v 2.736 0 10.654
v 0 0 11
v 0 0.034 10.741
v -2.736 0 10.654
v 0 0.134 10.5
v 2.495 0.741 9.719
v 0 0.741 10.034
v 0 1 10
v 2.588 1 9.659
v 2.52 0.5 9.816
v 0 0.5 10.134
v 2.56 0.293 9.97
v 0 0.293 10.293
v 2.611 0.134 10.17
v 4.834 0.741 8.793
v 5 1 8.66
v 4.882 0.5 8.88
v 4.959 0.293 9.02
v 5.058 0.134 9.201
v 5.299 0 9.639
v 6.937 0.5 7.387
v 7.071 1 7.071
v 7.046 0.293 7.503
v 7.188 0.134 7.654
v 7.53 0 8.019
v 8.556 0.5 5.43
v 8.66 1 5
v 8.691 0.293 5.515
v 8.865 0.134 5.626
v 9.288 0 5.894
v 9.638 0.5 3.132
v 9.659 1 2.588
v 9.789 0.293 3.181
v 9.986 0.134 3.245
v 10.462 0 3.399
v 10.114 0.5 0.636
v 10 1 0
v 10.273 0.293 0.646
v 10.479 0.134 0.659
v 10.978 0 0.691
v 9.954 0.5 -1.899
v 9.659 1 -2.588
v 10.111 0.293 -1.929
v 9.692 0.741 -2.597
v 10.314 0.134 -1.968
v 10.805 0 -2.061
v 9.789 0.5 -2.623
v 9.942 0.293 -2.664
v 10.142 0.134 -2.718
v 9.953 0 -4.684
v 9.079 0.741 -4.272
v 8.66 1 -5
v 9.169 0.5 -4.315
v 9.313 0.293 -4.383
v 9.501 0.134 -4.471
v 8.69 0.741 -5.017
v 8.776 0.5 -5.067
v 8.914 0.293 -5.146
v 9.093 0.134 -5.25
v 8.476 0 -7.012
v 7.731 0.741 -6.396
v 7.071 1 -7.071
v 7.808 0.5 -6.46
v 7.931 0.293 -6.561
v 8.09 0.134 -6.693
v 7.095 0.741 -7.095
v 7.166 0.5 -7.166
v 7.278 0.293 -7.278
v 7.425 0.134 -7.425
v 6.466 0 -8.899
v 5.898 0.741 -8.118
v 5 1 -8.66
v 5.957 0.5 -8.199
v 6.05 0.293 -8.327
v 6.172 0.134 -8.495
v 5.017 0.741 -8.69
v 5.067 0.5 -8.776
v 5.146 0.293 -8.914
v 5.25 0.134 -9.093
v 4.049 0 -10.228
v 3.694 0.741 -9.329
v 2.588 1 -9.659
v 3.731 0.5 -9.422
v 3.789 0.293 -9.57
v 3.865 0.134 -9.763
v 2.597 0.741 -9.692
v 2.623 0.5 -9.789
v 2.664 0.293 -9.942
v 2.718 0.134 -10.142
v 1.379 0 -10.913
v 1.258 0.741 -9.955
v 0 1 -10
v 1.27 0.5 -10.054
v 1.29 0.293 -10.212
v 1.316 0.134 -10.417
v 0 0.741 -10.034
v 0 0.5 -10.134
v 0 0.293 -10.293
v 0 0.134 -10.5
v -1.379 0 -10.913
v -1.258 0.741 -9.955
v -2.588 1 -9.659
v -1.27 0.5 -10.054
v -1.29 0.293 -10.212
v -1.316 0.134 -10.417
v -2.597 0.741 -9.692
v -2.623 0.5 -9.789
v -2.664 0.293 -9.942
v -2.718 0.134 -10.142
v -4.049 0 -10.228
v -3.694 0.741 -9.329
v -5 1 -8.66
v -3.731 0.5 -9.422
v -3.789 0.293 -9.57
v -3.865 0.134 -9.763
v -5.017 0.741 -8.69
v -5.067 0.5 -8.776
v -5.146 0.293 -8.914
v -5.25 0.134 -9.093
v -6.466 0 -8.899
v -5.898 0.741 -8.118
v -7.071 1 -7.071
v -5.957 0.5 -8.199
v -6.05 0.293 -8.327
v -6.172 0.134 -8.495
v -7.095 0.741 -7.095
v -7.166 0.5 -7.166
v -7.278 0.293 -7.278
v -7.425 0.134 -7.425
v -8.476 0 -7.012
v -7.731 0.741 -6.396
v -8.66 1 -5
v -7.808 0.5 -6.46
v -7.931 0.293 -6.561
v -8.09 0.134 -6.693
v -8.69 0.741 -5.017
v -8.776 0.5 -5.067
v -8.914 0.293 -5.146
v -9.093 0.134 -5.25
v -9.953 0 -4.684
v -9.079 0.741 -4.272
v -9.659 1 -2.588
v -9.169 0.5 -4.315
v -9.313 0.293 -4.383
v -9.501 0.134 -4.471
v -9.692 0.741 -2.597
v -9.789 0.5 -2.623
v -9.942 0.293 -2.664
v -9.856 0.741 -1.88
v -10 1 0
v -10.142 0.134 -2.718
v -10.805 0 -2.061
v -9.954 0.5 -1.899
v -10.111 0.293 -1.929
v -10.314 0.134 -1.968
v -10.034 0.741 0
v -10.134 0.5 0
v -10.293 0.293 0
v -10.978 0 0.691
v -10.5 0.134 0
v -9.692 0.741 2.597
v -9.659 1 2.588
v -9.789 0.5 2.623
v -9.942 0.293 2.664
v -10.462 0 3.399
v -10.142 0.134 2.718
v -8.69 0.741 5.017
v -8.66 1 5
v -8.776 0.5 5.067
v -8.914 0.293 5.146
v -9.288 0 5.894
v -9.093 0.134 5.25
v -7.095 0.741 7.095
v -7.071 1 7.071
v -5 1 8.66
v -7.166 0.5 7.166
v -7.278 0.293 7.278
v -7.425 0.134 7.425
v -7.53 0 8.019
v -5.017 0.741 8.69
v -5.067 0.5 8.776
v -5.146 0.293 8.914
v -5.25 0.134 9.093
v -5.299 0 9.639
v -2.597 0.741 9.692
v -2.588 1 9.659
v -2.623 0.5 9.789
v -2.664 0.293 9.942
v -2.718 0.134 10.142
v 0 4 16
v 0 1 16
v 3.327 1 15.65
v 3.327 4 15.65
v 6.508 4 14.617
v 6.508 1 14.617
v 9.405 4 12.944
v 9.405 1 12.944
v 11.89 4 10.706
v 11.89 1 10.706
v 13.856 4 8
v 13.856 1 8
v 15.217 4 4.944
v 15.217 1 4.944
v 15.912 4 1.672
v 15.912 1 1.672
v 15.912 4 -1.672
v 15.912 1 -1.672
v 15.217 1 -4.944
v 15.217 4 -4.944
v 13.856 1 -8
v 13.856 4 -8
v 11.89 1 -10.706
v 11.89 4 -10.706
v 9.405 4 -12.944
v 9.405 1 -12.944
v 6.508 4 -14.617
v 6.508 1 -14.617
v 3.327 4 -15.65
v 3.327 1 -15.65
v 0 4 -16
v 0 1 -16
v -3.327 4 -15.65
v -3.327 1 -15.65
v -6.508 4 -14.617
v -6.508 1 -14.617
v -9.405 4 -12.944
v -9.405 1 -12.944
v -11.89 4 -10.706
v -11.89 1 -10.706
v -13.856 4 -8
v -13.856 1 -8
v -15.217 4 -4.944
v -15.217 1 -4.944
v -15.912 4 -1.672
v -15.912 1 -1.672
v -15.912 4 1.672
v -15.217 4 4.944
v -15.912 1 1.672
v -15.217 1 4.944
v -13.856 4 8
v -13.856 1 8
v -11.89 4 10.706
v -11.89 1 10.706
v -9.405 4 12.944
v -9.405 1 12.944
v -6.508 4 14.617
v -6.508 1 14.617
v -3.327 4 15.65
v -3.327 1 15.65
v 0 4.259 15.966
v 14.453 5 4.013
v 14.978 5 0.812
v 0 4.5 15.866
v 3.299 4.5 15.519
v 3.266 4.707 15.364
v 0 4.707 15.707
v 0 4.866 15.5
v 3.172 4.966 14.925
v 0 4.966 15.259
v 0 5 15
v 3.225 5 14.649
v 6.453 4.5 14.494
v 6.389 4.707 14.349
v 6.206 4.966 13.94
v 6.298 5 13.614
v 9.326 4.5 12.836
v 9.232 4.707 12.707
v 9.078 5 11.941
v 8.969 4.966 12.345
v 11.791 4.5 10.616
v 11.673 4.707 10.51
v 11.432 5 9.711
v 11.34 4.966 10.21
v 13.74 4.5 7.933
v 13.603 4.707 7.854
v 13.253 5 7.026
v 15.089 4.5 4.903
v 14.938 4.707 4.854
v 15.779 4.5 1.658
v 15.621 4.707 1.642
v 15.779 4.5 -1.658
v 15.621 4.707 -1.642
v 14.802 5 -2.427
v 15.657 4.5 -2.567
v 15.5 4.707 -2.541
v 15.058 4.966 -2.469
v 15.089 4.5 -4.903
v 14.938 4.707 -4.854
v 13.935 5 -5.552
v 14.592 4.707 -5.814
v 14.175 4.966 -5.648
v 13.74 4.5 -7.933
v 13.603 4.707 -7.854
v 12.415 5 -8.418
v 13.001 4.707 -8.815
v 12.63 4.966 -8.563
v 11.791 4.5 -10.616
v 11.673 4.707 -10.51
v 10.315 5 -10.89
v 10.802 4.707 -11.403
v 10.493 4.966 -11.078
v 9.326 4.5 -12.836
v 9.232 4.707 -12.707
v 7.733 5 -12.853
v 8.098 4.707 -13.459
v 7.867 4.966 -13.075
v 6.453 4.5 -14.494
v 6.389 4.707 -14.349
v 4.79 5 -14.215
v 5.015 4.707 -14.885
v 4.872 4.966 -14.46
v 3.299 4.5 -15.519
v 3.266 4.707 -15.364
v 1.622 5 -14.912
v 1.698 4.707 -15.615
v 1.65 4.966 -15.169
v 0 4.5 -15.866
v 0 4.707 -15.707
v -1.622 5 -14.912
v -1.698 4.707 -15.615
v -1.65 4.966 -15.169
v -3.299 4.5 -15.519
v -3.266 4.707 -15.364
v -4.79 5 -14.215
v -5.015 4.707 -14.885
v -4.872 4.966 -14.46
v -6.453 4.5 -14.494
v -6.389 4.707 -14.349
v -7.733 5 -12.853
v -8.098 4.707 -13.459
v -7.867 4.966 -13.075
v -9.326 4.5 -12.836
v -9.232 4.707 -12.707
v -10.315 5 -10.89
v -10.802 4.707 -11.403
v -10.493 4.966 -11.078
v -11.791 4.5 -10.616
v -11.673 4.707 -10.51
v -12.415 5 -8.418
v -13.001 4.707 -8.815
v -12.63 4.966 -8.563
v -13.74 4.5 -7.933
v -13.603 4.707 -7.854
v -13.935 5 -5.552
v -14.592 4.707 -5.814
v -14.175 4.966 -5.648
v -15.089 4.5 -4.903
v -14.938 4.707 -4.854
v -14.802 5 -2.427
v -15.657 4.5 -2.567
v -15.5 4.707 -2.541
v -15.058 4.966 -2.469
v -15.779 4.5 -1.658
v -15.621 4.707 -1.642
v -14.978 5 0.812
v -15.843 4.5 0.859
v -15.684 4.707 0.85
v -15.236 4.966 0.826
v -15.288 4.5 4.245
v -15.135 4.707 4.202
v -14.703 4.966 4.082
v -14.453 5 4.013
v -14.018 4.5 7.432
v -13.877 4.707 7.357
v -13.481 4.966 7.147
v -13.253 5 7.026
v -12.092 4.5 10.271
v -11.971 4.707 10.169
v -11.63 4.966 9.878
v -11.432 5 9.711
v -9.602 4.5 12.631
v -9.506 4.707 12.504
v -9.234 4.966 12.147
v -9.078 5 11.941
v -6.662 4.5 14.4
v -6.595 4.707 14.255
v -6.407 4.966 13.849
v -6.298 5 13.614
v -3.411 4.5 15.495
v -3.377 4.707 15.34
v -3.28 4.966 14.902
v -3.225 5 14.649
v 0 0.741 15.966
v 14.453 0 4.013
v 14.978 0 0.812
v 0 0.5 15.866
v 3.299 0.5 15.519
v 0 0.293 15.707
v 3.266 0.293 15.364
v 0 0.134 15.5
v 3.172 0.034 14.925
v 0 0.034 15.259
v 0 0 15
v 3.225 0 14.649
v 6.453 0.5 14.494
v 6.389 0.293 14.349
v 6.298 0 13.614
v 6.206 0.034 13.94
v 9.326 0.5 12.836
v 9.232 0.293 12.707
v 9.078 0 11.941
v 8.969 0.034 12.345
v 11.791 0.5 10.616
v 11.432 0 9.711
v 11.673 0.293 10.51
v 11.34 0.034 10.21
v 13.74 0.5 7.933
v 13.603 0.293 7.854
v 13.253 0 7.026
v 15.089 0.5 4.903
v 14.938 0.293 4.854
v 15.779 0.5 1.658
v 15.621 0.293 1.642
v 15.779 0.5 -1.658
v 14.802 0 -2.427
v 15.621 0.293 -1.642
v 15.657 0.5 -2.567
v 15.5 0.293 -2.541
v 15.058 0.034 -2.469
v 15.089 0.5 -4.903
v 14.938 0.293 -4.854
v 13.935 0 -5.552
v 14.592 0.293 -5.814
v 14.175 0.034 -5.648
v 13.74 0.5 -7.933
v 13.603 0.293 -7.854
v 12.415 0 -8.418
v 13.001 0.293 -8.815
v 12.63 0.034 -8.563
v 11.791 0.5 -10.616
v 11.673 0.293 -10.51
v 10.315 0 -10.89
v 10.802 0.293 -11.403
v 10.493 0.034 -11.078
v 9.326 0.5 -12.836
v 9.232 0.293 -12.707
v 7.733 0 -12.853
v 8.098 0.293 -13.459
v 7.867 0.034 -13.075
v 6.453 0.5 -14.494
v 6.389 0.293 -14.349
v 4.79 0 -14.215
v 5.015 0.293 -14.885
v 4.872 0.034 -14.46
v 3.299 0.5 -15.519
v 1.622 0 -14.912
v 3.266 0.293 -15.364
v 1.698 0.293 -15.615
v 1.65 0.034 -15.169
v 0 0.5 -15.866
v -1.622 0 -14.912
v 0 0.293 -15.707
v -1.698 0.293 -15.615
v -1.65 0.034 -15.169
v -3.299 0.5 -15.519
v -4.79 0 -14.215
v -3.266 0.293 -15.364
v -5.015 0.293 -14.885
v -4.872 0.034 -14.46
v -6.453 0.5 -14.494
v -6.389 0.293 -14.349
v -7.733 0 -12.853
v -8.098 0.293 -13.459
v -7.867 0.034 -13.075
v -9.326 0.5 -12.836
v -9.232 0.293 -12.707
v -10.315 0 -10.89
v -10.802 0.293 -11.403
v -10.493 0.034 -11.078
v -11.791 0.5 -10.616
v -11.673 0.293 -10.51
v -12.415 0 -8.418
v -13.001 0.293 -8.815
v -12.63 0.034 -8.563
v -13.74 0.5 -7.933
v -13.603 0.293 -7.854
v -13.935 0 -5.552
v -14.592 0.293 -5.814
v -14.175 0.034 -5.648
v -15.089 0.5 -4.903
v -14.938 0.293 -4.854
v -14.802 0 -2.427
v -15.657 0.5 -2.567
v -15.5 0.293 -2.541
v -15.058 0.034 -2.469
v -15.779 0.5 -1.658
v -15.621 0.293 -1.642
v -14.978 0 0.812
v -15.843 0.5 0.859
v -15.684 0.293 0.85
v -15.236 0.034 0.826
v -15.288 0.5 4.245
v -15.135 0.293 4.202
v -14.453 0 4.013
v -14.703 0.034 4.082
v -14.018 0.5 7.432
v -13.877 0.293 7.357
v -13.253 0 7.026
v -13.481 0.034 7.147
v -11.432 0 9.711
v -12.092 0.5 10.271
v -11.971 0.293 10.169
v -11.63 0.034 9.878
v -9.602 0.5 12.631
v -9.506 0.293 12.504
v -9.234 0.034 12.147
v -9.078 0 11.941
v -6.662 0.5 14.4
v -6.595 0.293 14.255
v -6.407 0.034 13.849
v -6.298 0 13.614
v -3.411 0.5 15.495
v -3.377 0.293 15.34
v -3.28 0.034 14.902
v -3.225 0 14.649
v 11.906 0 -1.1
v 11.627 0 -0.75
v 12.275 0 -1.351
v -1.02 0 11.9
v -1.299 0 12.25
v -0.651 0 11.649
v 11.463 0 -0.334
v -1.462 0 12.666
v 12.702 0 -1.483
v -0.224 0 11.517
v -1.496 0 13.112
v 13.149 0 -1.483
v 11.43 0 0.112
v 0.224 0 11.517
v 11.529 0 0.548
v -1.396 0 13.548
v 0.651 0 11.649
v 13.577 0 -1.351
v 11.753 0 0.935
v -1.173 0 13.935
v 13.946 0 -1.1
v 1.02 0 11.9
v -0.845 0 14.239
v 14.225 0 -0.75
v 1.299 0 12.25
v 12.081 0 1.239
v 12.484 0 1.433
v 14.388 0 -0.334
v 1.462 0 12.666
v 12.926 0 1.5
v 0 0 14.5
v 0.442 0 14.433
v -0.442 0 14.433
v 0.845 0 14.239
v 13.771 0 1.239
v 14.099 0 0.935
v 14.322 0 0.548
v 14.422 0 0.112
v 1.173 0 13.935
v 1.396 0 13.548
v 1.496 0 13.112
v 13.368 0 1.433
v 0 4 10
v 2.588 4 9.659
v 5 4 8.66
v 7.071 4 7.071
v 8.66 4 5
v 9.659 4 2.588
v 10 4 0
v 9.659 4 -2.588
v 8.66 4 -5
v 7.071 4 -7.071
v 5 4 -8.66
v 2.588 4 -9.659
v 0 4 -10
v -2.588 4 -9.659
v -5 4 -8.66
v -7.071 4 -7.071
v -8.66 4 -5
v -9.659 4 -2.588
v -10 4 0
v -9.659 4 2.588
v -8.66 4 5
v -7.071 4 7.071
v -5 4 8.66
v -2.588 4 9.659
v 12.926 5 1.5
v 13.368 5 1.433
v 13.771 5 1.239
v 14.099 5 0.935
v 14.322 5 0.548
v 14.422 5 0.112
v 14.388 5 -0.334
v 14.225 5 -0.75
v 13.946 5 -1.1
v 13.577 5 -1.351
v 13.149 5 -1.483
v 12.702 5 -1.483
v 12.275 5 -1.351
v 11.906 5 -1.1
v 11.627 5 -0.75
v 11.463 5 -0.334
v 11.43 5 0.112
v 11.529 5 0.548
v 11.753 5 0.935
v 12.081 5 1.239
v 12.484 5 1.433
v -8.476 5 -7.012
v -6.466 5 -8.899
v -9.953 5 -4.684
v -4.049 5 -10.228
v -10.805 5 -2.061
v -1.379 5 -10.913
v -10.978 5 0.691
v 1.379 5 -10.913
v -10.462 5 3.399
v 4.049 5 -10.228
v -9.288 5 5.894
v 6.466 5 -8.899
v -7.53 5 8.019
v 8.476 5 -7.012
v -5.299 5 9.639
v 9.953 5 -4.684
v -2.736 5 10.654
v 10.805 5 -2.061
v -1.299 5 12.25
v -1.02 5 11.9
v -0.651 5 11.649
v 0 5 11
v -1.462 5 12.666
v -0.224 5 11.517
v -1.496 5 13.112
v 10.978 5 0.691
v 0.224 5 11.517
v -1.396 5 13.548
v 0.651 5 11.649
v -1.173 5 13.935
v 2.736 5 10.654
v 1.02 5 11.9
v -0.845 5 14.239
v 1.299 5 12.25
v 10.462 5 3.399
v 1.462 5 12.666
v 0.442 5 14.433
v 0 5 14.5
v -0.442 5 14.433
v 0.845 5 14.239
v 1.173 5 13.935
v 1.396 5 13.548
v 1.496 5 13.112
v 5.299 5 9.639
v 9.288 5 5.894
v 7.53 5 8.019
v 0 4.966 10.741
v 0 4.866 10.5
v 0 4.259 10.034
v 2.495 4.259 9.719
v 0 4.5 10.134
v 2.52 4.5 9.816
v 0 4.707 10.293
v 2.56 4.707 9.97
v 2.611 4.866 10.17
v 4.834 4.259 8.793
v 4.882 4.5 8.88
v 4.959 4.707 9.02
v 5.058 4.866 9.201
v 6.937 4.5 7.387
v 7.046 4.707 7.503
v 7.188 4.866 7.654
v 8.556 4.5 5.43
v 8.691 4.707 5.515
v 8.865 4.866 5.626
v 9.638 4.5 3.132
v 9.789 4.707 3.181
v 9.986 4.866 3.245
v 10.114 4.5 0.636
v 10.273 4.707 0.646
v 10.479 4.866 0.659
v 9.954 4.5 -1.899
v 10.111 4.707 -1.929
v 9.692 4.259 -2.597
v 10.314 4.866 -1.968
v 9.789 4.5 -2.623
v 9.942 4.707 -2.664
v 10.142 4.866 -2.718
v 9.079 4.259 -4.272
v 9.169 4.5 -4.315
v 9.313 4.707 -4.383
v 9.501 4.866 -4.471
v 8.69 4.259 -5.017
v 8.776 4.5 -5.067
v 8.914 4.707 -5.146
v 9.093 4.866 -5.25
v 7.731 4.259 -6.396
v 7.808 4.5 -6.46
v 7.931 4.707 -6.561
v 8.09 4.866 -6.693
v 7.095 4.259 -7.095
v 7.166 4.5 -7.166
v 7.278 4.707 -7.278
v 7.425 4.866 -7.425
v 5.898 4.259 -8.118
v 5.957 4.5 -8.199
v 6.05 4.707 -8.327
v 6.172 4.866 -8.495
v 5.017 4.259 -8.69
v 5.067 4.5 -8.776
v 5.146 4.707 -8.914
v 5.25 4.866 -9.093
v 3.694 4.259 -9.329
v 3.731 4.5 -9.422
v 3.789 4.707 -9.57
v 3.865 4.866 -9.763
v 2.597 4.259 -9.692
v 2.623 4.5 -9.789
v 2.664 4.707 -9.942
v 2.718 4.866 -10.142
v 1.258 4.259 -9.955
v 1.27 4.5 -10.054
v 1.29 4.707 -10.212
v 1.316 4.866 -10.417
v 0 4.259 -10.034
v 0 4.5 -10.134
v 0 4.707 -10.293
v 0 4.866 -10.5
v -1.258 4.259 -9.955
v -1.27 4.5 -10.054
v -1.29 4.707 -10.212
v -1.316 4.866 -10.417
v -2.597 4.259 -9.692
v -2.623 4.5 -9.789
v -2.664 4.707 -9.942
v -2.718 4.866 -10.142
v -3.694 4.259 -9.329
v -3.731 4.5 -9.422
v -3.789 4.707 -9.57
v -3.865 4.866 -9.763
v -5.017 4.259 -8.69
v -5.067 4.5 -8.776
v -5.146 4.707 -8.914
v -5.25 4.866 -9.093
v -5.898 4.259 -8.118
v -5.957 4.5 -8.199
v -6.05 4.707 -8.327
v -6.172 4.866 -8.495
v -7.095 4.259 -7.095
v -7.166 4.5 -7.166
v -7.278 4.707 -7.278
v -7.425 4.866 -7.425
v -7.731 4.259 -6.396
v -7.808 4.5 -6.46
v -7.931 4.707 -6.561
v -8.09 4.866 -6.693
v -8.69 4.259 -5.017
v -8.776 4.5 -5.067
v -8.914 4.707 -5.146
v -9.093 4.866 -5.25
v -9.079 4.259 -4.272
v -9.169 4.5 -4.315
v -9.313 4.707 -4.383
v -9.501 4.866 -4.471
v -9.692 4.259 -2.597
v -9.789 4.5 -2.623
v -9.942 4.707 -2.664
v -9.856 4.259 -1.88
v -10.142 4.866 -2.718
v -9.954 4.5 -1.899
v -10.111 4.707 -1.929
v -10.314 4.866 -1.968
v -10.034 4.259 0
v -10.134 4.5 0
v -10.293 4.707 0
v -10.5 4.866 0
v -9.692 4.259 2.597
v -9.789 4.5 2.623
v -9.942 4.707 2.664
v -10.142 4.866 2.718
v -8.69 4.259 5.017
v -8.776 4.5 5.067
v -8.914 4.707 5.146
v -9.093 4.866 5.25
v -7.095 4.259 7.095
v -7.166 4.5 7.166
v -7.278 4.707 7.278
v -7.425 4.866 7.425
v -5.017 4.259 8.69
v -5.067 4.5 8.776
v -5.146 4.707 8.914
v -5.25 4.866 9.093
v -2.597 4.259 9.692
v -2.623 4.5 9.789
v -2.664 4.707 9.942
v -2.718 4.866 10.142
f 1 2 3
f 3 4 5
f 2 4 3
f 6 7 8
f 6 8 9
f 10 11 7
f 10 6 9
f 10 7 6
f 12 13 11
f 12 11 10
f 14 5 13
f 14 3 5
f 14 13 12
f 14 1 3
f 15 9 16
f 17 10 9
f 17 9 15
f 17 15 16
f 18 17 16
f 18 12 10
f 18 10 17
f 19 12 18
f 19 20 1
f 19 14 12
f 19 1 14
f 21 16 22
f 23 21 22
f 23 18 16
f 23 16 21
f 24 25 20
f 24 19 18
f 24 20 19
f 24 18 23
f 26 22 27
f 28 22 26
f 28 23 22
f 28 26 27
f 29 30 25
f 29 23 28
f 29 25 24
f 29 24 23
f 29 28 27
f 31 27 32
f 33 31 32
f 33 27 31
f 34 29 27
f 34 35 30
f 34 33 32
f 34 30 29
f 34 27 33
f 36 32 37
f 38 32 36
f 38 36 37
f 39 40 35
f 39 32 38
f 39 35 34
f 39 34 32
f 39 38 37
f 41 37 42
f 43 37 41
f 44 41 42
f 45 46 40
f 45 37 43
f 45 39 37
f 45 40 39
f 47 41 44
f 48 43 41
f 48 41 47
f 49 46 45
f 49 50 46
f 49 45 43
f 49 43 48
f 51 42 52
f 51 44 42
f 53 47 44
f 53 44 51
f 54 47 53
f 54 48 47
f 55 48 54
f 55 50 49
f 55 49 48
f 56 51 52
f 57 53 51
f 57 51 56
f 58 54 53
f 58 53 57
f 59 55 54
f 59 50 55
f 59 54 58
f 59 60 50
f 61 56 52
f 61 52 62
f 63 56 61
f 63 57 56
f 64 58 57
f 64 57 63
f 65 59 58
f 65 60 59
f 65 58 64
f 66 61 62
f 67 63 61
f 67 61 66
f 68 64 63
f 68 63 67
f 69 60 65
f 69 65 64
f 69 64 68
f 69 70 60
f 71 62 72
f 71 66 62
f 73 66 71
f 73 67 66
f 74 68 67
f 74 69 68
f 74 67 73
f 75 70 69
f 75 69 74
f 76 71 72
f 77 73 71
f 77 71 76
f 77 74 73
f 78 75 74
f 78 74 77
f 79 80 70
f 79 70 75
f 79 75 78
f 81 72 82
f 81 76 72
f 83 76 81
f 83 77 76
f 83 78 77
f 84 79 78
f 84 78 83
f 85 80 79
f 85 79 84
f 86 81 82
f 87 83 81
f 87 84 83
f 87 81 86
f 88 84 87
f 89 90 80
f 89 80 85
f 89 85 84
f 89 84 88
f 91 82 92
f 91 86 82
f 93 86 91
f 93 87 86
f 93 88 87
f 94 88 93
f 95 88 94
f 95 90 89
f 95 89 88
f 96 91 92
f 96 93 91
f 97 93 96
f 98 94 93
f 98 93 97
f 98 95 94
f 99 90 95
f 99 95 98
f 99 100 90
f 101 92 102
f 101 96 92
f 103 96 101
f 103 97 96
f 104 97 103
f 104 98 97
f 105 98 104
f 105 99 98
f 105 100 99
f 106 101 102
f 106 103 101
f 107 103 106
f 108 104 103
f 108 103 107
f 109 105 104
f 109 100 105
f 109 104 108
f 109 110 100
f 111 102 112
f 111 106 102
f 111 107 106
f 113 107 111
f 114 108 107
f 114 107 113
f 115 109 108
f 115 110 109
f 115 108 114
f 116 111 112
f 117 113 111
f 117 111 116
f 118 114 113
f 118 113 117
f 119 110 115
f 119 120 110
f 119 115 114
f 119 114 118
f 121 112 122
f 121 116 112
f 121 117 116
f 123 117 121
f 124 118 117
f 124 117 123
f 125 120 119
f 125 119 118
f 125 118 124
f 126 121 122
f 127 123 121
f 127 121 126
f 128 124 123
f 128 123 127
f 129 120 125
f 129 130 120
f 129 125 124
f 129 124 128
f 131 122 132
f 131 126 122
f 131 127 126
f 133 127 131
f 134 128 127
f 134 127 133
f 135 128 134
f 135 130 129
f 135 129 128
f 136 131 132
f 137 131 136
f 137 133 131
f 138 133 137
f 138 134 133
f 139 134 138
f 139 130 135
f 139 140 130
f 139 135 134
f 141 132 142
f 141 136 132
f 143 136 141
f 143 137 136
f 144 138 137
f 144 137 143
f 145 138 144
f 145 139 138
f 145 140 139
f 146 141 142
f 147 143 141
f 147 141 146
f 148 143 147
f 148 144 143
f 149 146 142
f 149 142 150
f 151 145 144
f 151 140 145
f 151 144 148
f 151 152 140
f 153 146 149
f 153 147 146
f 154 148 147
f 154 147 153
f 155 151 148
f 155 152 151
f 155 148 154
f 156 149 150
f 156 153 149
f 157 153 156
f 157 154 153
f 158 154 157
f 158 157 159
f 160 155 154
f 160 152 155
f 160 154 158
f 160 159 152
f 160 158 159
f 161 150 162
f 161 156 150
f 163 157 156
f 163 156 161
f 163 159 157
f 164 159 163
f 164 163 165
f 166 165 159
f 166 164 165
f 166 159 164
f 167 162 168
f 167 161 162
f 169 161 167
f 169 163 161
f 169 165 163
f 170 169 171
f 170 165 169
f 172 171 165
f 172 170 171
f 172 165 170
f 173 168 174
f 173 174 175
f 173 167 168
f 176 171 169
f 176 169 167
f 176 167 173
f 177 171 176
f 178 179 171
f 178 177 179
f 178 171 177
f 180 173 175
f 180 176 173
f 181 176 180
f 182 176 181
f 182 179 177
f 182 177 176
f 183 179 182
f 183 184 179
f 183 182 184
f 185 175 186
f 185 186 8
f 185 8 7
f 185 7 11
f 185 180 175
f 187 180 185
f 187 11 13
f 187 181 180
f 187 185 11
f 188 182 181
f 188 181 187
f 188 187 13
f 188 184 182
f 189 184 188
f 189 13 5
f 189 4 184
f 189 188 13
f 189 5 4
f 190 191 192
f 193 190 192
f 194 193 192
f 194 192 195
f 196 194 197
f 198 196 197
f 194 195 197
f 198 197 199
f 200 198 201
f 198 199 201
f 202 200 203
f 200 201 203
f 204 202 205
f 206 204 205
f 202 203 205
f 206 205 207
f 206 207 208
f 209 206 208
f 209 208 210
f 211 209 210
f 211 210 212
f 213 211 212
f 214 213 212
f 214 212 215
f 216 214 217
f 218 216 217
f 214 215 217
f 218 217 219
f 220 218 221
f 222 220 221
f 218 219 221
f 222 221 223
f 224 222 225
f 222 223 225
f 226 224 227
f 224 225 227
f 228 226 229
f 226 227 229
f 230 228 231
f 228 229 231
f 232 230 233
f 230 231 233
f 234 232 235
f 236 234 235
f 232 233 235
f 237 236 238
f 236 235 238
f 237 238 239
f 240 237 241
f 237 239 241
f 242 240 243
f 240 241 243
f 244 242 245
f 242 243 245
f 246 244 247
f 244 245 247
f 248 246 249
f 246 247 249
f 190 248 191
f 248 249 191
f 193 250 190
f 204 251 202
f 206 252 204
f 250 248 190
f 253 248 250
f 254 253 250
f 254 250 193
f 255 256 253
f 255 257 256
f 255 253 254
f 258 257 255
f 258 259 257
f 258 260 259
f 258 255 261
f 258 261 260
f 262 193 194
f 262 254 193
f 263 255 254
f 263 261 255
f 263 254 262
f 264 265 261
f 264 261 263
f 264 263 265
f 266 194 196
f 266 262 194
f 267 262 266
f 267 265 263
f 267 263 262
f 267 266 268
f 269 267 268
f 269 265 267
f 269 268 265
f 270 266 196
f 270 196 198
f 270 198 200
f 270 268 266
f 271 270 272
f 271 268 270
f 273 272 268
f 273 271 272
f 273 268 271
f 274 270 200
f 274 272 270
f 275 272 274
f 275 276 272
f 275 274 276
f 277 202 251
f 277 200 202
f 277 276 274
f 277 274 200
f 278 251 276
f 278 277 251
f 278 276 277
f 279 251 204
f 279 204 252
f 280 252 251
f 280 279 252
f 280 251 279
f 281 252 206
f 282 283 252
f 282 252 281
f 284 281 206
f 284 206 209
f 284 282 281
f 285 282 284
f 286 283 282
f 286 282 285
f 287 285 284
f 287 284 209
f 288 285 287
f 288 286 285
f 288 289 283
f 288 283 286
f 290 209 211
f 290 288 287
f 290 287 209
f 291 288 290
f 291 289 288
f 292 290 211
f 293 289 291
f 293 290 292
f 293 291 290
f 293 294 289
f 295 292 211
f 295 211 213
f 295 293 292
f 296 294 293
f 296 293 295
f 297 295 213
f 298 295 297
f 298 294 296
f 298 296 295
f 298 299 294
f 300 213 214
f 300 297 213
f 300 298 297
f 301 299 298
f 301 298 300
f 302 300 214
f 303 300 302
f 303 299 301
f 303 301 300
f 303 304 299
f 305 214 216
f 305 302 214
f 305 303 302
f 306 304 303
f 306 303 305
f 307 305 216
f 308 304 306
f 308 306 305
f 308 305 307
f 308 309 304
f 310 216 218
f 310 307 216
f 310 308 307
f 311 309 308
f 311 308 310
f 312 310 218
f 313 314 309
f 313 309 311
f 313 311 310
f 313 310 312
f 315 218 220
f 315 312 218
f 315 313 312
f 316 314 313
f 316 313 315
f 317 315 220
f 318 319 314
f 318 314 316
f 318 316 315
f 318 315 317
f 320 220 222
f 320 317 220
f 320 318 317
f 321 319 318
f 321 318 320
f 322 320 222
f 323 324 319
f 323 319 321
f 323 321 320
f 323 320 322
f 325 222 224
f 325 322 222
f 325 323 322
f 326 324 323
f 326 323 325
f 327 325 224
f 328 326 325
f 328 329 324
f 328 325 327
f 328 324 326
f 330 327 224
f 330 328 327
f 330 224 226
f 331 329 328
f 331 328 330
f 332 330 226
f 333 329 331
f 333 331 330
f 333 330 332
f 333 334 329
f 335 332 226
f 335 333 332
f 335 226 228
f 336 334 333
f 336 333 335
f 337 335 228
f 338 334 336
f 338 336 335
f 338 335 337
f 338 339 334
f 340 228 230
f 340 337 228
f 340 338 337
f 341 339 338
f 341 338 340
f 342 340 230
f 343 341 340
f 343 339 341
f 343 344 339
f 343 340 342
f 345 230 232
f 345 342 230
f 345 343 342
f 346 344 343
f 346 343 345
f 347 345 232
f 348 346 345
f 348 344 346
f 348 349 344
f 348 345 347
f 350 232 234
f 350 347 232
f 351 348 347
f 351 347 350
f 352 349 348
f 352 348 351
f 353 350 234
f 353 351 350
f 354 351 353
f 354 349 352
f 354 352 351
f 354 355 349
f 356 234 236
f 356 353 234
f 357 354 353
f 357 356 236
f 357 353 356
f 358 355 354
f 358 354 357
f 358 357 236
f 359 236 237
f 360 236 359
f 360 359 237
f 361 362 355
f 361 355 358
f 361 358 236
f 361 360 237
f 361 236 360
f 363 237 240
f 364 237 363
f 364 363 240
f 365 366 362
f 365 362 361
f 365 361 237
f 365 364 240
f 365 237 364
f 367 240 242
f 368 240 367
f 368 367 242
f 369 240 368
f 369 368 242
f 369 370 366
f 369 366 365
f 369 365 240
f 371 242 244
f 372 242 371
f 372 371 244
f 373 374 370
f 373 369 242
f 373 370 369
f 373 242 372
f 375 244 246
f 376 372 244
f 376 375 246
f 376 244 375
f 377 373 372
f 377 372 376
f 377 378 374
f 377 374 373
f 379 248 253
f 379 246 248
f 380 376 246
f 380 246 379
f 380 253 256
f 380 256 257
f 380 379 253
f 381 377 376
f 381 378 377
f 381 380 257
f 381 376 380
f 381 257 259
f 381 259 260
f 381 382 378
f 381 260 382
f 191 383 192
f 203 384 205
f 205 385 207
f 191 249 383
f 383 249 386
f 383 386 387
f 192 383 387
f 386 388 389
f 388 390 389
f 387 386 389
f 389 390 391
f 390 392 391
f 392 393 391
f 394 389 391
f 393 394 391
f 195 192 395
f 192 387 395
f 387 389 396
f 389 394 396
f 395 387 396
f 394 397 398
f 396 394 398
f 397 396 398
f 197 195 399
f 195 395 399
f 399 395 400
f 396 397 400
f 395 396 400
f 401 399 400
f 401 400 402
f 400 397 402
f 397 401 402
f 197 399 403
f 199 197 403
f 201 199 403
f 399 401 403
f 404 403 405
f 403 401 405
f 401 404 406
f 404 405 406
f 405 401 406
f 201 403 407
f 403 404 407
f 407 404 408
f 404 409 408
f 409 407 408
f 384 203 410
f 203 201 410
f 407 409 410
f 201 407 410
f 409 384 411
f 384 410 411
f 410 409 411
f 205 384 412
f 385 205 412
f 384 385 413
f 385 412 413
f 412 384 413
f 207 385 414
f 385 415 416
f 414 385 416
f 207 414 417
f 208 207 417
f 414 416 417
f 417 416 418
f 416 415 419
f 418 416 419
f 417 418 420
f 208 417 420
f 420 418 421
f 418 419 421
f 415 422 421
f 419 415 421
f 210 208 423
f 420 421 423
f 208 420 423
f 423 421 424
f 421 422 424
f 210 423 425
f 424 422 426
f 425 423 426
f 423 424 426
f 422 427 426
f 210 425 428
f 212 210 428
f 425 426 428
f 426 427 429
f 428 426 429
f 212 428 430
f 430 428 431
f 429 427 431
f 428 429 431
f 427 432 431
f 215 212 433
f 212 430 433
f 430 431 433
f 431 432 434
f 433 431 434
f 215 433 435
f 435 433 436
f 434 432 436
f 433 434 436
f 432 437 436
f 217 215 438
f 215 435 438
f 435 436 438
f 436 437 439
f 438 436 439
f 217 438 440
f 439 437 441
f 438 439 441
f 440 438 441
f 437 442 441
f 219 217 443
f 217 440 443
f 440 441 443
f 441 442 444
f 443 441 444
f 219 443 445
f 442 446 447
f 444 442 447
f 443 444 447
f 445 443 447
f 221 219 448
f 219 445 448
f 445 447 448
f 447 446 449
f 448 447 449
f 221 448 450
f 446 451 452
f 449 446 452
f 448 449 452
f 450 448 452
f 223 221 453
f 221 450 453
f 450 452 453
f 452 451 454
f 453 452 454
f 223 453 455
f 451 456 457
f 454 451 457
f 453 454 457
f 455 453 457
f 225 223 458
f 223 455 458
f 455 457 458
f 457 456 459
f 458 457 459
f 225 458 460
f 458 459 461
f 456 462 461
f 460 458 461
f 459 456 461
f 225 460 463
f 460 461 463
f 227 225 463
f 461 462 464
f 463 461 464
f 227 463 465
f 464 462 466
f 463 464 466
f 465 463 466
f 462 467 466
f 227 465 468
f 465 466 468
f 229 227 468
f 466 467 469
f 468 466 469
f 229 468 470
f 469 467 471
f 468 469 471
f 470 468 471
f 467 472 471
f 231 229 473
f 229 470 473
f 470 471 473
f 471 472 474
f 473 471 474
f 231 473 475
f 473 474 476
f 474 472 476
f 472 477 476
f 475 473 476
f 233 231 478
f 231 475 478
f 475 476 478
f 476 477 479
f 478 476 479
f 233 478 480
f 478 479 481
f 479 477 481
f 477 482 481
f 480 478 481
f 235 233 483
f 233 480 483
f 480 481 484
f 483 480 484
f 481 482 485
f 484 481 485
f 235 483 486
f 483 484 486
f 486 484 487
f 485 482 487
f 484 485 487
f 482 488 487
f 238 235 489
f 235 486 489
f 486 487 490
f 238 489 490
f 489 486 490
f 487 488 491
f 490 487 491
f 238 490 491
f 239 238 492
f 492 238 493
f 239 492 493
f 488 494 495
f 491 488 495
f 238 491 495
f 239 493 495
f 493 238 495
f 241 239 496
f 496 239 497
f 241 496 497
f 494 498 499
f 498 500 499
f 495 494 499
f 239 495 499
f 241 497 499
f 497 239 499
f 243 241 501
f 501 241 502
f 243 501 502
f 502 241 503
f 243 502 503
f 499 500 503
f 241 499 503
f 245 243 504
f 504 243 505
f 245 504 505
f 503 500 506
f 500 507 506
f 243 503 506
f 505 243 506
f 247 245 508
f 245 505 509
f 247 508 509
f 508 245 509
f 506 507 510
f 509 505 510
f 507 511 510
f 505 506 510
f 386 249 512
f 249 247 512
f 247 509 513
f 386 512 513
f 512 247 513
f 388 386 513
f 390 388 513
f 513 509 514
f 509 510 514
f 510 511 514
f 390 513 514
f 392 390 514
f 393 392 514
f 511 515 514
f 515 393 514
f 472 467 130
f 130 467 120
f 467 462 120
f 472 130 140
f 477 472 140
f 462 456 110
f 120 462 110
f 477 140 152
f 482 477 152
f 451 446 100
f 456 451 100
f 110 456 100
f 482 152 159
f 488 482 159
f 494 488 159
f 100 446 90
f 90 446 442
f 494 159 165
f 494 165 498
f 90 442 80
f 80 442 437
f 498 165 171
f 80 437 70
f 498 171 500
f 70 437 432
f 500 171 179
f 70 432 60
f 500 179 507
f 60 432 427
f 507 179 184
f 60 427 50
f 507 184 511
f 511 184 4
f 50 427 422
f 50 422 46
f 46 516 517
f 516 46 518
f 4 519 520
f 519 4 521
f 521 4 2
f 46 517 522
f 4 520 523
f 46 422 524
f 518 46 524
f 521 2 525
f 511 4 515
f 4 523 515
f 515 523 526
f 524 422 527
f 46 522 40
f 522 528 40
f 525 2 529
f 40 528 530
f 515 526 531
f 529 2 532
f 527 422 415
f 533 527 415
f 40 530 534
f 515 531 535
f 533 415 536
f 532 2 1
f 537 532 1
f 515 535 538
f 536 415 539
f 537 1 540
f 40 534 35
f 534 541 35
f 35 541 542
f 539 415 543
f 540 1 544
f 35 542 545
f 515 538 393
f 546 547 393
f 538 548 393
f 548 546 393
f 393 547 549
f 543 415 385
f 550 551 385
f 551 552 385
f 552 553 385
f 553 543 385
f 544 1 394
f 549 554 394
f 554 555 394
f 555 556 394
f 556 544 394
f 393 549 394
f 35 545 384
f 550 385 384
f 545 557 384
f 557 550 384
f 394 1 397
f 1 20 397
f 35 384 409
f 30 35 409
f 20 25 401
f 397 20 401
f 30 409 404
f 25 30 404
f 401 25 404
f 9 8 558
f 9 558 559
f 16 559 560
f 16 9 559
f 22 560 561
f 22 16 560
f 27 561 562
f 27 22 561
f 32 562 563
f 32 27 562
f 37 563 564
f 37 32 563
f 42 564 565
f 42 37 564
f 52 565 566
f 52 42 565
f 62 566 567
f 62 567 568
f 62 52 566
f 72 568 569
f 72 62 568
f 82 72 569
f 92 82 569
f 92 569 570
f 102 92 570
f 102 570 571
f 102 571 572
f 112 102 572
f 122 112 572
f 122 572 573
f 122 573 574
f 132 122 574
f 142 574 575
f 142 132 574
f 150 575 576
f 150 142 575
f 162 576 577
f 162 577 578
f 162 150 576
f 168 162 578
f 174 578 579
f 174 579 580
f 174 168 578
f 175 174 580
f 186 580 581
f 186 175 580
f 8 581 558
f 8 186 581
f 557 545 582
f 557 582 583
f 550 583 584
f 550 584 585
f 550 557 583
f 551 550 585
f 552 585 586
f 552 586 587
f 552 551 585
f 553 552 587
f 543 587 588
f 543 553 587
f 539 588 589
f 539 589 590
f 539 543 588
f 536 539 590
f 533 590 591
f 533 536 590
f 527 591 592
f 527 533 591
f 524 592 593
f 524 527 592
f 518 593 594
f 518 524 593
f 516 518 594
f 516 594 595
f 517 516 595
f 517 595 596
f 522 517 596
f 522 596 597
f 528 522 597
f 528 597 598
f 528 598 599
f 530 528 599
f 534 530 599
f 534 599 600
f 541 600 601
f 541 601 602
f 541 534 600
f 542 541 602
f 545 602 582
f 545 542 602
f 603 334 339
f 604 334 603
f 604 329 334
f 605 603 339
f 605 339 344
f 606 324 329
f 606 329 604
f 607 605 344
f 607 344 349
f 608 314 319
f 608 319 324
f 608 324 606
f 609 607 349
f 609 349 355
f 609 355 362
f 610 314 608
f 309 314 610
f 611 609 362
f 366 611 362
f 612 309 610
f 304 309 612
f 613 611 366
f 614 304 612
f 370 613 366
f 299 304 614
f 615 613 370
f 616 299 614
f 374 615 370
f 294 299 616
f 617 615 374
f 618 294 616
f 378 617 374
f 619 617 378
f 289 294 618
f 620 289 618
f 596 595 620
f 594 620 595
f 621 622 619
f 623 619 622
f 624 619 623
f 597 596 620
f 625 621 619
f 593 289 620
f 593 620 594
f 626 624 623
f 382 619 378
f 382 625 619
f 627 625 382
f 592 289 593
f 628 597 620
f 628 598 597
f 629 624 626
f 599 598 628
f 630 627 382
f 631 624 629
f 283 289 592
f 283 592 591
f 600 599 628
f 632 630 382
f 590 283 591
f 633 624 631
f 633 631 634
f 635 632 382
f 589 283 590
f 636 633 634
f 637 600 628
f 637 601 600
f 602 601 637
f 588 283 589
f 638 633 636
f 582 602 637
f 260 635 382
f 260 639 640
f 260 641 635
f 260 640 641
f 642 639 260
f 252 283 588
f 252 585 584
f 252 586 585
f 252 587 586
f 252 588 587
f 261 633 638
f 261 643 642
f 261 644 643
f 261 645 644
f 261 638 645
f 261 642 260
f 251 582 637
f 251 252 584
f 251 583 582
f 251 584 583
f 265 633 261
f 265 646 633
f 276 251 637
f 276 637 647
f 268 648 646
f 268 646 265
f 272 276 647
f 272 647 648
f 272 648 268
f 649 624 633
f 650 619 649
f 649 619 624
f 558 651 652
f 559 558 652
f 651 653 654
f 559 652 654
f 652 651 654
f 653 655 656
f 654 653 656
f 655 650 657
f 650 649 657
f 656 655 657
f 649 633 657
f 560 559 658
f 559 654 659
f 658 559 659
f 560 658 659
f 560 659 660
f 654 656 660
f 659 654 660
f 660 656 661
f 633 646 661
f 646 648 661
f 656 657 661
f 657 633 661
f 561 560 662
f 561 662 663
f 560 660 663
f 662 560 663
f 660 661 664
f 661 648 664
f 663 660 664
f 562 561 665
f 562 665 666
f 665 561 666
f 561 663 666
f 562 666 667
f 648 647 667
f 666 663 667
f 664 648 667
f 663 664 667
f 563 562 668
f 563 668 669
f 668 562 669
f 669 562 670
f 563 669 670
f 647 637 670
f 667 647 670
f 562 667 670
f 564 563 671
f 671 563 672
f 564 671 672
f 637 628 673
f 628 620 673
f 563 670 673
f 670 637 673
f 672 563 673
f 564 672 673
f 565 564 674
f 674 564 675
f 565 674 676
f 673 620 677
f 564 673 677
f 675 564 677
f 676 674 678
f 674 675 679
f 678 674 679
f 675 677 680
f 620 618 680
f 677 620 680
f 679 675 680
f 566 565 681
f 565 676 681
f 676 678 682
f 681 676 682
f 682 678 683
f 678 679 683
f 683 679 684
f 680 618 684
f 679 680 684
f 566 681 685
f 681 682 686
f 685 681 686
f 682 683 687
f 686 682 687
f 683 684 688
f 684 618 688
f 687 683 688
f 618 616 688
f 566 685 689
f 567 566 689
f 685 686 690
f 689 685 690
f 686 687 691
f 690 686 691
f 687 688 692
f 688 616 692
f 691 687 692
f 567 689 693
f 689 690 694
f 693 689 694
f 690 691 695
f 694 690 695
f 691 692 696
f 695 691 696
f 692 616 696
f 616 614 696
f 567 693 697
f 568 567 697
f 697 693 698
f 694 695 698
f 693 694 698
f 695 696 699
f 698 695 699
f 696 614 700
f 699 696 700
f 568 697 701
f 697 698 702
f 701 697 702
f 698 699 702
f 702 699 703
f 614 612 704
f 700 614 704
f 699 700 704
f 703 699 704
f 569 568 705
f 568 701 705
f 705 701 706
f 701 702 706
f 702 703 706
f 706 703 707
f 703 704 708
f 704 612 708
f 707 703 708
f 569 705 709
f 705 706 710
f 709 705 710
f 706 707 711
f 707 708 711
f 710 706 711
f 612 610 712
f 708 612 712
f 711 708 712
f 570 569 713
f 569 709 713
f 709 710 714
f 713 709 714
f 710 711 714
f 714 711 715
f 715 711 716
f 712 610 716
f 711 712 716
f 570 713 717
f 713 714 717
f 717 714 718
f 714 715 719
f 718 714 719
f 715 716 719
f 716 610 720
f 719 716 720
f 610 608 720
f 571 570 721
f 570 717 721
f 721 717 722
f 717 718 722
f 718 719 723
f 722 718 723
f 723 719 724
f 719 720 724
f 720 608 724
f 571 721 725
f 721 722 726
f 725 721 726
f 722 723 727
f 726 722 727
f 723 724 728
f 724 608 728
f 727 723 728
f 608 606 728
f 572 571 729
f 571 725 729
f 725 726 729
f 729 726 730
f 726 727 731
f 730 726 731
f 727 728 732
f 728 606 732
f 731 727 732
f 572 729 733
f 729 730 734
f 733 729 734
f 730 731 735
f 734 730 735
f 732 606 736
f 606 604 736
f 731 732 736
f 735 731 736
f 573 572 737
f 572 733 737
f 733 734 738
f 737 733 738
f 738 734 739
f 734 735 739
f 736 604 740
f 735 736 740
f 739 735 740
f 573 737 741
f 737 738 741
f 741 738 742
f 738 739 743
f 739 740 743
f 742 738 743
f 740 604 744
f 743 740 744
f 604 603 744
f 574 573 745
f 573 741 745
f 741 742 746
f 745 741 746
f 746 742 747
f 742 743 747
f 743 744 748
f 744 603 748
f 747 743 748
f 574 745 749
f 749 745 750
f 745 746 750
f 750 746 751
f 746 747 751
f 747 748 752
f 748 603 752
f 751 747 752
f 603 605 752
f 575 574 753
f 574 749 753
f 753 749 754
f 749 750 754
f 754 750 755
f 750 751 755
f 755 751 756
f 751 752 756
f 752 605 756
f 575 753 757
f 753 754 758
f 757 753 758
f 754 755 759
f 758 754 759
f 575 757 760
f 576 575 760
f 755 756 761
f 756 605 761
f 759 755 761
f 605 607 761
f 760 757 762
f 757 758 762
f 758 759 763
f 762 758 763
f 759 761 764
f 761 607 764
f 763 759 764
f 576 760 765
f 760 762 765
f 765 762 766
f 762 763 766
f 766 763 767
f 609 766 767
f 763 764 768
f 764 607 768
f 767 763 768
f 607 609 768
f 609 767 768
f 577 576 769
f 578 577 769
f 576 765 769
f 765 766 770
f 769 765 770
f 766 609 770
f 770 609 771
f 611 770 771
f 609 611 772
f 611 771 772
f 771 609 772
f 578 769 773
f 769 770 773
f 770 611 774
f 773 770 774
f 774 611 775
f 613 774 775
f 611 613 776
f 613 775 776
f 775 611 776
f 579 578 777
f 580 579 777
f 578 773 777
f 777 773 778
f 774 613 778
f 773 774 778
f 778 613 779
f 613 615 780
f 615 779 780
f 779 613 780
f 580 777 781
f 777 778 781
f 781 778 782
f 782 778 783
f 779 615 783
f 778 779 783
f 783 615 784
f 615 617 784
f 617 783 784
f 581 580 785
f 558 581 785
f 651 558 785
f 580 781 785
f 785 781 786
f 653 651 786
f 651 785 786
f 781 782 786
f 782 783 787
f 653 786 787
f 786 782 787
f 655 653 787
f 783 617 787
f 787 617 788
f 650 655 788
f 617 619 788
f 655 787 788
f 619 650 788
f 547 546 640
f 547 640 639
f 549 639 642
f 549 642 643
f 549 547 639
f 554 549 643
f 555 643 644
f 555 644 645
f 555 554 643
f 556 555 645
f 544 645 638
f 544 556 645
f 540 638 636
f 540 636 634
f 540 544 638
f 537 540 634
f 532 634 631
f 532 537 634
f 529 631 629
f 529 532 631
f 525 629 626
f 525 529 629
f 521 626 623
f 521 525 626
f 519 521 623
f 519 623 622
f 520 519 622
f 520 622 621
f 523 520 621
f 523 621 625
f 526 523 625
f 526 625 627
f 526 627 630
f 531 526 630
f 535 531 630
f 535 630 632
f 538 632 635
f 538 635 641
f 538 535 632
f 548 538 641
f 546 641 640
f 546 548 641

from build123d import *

# Parameters (mm, degrees)
SKETCH1_R           = 16
SKETCH1_R_2         = 10
SKETCH1_R_3         = 1.5
BOSS_EXTRUDE1_DEPTH = 5
FILLET1_R           = 1


with BuildPart() as part:
    # Sketch1 → Boss-Extrude1 (new body)
    with BuildSketch(Plane(origin=(0, 0, 0), x_dir=(1, 0, 0), z_dir=(0, 1, 0))):
        with Locations(Location((0, 0, 0), (0, 0, 270))):
            Circle(SKETCH1_R)
        with Locations(Location((0, 0, 0), (0, 0, 270))):
            Circle(SKETCH1_R_2, mode=Mode.SUBTRACT)
        with Locations(Location((0, -13, 0), (0, 0, 270))):
            Circle(SKETCH1_R_3, mode=Mode.SUBTRACT)
        with Locations(Location((12.925776556, 0, 0), (0, 0, 270))):
            Circle(SKETCH1_R_3, mode=Mode.SUBTRACT)
    extrude(amount=BOSS_EXTRUDE1_DEPTH)

    # Fillet1
    fillet1_edges = [part.edges().sort_by_distance(p)[0] for p in [
        (0, 0, -16),
        (0, 5, -16),
        (0, 0, -10),
        (0, 5, -10),
    ]]
    fillet(fillet1_edges, radius=FILLET1_R)


solid = part.part
